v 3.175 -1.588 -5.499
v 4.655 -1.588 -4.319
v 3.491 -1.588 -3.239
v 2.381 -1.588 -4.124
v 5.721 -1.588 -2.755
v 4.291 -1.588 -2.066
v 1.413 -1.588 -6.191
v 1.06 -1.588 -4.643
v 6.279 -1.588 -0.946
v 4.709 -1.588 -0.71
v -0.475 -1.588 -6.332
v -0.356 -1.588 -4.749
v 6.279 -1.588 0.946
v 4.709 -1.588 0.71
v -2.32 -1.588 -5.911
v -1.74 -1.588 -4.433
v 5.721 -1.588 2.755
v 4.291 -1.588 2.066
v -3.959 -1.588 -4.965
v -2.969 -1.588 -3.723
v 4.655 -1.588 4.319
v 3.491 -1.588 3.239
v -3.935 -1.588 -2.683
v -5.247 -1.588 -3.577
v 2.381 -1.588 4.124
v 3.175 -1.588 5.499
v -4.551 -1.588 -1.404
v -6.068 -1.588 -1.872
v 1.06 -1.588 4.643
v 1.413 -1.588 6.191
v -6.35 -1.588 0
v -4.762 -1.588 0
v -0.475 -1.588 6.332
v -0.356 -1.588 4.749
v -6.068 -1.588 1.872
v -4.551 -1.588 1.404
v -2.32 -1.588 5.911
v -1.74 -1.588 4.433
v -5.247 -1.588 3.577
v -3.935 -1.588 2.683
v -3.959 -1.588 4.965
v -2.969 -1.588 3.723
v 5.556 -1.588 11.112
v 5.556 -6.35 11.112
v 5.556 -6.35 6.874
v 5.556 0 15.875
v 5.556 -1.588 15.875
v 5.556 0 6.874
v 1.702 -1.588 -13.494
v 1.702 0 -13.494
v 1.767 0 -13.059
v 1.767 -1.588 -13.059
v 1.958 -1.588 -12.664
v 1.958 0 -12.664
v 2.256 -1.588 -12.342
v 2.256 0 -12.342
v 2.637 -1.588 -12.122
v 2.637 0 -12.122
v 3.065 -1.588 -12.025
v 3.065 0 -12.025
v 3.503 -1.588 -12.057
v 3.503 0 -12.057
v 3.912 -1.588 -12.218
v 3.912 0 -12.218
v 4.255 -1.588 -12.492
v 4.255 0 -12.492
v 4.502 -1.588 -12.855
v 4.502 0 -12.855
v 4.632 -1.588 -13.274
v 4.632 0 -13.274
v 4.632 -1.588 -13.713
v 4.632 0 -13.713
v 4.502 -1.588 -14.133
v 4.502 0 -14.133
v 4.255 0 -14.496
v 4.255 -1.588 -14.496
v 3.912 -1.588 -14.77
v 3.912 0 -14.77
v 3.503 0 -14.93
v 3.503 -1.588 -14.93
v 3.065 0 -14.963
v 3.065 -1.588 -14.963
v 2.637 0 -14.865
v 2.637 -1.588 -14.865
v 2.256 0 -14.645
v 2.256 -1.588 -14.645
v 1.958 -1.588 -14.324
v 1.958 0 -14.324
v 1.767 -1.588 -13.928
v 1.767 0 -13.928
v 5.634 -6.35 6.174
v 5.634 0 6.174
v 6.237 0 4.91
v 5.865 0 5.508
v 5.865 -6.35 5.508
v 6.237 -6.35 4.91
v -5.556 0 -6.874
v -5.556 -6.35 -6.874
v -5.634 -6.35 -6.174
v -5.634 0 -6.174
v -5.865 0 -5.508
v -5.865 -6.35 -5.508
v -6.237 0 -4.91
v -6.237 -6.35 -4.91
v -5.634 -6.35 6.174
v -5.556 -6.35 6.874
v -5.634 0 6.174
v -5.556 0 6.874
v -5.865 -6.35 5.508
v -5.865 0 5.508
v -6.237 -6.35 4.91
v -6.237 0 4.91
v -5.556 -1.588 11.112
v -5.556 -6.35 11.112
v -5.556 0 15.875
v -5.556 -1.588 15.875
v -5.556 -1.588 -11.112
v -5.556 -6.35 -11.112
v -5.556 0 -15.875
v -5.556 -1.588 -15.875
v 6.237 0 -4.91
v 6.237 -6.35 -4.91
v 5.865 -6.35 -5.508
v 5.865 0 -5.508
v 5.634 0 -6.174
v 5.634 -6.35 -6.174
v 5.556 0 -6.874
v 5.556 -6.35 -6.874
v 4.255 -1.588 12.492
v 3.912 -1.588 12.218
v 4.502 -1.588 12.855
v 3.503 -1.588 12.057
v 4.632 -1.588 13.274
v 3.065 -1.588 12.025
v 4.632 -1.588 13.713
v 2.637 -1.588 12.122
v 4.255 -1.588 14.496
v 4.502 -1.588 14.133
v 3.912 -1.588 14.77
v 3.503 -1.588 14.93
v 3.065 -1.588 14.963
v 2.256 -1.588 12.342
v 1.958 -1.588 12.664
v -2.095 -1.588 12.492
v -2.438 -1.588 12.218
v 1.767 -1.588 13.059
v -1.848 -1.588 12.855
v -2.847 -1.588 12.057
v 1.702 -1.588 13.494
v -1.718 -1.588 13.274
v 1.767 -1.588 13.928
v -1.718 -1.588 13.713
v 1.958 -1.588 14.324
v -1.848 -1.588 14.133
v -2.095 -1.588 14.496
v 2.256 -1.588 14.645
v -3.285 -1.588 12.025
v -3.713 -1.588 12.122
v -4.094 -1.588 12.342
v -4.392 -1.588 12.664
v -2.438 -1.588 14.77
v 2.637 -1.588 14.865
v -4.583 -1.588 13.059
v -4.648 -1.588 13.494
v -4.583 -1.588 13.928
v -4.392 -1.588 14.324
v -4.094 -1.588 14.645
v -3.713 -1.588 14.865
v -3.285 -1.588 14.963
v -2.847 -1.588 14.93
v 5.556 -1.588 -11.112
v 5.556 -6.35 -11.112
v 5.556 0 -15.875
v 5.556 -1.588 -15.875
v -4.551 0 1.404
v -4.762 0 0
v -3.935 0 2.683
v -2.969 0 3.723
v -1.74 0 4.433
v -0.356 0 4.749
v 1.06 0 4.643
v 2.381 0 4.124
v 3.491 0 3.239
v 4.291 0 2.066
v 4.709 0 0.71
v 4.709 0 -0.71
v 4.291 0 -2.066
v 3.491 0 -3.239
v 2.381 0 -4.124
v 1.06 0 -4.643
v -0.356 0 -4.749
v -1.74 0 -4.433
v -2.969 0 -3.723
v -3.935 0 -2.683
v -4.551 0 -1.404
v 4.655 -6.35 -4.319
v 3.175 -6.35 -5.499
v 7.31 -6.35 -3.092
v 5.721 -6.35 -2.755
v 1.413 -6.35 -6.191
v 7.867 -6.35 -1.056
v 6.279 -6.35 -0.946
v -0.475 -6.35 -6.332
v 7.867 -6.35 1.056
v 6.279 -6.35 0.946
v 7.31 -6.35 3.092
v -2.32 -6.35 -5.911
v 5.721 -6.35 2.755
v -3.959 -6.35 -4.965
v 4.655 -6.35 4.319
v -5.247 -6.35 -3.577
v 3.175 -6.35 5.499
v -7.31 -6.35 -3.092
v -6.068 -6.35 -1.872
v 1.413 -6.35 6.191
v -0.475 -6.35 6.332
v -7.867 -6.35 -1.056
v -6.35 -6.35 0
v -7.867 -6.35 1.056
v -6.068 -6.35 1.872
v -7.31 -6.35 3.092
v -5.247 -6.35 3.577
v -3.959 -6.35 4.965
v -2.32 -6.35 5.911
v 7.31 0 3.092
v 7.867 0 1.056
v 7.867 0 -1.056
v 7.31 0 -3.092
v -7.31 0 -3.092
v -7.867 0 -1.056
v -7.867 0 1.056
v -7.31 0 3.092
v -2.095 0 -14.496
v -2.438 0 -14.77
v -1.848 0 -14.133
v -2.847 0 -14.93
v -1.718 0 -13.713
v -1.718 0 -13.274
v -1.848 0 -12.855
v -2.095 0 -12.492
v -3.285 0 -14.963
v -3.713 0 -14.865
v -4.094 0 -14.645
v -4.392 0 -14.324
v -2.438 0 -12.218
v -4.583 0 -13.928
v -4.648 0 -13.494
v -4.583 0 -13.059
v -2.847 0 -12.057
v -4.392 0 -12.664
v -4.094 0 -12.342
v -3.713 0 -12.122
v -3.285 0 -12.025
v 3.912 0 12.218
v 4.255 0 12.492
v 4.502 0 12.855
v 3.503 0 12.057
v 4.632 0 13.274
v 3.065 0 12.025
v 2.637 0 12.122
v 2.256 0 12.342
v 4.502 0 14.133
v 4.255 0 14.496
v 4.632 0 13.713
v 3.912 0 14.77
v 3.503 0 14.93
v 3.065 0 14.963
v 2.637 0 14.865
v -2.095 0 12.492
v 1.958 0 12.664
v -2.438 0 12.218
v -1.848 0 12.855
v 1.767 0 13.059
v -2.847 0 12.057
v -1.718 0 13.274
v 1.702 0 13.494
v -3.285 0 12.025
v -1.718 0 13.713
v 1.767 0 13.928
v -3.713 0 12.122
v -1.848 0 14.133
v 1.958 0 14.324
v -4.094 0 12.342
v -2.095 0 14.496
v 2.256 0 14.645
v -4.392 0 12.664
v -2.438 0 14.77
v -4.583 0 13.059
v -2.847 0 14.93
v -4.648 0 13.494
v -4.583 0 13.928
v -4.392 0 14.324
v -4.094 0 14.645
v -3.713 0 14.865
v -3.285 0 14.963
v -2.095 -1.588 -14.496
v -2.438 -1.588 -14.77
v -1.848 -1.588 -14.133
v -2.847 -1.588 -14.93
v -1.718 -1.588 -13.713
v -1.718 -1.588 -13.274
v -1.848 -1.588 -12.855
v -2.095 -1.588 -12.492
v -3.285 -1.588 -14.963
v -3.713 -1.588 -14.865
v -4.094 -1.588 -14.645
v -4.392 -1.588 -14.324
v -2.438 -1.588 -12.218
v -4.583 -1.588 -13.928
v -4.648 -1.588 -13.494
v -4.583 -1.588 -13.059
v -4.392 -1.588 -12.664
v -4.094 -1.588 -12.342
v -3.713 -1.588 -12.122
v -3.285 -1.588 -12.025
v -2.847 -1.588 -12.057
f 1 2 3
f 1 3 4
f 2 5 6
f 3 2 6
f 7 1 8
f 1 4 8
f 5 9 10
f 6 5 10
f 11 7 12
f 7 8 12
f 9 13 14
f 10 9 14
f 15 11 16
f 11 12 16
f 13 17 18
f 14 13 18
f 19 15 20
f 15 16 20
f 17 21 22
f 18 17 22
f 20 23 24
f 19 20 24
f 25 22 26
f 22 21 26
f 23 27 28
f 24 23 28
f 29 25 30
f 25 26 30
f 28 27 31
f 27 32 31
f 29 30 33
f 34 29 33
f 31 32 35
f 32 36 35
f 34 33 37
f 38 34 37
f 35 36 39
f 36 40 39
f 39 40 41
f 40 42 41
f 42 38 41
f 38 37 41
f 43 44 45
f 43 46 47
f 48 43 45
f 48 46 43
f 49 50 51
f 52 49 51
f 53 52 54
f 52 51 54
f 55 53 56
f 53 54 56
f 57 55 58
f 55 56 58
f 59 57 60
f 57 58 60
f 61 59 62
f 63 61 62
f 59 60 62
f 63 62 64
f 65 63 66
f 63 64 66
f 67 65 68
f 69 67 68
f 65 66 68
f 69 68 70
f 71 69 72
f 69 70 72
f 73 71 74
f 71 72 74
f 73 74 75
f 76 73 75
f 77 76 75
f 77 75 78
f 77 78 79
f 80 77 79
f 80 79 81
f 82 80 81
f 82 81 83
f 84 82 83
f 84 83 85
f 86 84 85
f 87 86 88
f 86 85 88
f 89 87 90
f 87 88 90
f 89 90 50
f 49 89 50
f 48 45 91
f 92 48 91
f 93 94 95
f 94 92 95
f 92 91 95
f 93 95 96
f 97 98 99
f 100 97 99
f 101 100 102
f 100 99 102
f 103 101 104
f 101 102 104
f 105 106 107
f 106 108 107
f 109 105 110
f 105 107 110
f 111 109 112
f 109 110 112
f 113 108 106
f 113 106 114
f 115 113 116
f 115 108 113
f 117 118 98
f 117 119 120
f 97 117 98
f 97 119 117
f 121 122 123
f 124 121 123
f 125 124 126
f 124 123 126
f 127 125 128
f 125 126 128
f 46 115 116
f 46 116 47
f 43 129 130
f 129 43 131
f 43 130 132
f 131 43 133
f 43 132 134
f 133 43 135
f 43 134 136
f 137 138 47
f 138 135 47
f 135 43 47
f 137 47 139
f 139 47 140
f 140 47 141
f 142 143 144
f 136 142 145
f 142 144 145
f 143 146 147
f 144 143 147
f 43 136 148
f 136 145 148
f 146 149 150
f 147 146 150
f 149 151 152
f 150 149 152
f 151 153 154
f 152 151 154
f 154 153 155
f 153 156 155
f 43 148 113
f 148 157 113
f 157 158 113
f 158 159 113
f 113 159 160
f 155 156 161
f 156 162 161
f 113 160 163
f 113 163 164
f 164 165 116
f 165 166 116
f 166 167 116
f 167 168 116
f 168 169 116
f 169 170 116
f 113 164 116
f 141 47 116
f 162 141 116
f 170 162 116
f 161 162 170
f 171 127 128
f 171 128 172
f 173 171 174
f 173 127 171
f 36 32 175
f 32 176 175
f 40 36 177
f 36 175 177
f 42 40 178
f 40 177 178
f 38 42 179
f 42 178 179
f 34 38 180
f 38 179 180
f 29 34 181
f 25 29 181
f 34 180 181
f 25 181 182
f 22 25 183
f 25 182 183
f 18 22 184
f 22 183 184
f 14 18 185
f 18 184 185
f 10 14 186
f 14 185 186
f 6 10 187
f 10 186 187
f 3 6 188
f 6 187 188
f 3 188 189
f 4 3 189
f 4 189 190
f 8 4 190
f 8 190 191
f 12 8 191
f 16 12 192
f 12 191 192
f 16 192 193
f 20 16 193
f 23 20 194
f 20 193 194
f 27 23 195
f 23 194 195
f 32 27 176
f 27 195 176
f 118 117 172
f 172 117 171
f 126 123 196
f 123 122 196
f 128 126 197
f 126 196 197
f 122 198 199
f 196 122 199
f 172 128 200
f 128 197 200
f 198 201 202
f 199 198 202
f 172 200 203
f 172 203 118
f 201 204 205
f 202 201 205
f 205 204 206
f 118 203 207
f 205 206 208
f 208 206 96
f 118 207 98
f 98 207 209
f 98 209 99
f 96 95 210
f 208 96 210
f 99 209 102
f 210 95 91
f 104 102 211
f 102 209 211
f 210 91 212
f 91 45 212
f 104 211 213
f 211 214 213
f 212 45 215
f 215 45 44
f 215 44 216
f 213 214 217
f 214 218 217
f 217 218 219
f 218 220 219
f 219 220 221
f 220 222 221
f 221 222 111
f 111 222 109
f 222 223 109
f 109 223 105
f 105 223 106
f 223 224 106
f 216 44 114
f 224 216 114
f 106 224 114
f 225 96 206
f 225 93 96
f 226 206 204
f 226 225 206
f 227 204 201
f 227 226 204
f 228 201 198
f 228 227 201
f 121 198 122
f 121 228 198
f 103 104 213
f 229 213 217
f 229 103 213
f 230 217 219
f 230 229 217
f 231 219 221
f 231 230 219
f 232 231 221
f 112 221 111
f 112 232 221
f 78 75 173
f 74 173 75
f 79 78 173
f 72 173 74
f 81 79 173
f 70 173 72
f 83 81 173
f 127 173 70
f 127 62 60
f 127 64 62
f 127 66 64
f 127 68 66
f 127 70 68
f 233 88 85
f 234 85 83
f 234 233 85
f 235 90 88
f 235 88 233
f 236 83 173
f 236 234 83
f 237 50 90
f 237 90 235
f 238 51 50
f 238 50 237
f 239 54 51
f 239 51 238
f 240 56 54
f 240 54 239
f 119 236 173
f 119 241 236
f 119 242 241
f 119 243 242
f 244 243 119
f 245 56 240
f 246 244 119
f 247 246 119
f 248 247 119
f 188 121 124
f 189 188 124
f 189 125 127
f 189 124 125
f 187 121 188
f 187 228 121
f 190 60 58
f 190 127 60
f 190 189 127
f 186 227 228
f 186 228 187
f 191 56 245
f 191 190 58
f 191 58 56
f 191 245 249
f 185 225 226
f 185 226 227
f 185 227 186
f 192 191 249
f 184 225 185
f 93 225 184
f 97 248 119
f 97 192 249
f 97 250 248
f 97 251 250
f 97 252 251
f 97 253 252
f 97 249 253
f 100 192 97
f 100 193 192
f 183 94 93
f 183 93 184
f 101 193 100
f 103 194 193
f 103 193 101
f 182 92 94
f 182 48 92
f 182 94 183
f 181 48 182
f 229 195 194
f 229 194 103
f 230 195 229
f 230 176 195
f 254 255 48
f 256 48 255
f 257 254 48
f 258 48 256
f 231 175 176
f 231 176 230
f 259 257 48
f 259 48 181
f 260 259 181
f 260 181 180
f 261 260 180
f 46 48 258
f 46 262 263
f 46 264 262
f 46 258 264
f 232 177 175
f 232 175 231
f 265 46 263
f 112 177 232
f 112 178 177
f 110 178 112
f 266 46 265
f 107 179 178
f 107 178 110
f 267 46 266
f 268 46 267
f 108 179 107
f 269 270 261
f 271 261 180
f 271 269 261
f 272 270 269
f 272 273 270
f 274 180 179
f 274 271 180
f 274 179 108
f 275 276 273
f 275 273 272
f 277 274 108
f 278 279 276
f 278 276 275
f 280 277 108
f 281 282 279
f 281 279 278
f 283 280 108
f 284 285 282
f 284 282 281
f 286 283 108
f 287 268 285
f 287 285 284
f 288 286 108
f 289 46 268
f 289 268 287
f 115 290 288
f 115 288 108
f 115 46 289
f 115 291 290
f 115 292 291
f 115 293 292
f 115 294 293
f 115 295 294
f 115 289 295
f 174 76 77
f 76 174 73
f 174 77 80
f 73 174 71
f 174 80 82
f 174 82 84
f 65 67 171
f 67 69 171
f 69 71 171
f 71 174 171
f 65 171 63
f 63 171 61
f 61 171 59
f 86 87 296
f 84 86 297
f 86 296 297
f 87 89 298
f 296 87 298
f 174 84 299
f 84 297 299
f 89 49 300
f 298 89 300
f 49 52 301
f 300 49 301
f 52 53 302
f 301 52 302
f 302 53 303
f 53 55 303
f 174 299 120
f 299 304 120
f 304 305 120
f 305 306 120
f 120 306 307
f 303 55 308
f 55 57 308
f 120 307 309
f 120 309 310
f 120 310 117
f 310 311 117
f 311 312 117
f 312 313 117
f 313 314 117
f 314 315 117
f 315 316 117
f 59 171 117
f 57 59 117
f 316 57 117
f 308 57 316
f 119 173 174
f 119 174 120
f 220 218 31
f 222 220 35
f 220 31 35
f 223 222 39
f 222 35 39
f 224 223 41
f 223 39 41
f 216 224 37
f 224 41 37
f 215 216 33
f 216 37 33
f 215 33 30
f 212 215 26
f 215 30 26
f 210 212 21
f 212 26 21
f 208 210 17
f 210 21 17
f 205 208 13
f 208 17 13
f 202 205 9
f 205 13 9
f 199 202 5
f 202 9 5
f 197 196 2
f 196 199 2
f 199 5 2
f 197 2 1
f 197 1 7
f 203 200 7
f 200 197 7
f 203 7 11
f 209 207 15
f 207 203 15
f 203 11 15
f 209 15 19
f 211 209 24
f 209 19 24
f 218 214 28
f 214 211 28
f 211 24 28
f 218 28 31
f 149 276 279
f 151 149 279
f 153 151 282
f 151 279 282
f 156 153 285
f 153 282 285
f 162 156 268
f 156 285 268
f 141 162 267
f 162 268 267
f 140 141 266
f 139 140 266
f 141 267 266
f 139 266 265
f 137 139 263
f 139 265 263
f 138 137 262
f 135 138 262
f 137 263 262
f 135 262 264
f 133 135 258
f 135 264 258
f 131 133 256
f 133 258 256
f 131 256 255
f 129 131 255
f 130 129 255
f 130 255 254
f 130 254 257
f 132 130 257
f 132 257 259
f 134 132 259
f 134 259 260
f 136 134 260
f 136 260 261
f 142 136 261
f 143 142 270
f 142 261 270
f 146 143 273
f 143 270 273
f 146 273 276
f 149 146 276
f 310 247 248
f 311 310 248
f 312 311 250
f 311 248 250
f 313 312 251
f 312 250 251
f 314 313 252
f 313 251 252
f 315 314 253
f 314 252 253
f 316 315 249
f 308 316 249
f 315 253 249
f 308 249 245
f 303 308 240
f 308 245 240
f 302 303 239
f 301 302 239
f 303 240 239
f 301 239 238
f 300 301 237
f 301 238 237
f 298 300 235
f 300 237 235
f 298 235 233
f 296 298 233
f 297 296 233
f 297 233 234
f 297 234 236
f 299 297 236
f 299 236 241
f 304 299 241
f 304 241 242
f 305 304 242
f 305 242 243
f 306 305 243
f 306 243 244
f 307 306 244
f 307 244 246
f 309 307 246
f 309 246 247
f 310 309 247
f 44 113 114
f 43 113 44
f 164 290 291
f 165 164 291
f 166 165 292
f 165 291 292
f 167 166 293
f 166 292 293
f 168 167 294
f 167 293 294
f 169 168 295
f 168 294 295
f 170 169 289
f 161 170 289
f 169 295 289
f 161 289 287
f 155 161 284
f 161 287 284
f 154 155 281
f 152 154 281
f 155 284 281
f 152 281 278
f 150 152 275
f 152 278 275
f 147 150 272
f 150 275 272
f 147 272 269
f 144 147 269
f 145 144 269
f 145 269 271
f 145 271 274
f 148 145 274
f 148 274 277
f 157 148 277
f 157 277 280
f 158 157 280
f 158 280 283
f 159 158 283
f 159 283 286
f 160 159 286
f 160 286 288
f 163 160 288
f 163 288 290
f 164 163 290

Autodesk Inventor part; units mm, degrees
ref_plane "YZ Plane" through (0, 0, 0) normal (1, 0, 0) x (0, 1, 0)
ref_plane "XZ Plane" through (0, 0, 0) normal (0, 1, 0) x (-1, 0, 0)
ref_plane "XY Plane" through (0, 0, 0) normal (0, 0, 1) x (1, 0, 0)
sketch "Sketch1" plane through (0, 0, 0) normal (0, 1, 0) x (-1, 0, 0)
  circle A0 centre (0, 0) radius 6.35
  circle A1 centre (0, 0) radius 7.9375
  line L0 (5.5563, 15.875) -> (-5.5563, 15.875)
  line L1 (-5.5563, 15.875) -> (-5.5563, -15.875)
  line L2 (-5.5563, -15.875) -> (5.5563, -15.875)
  line L3 (5.5563, -15.875) -> (5.5563, 15.875)
  line L4 (5.5563, 15.875) -> (-5.5563, -15.875) construction
  line L5 (-5.5563, 15.875) -> (5.5563, -15.875) construction
  line L6 (-5.5563, 0) -> (5.5563, 0) construction
  line L7 (-5.5563, 15.875) -> (5.5563, 15.875)
  line L8 (5.5563, 15.875) -> (5.5563, 11.1125)
  line L9 (5.5563, 11.1125) -> (-5.5563, 11.1125)
  line L10 (-5.5563, 11.1125) -> (-5.5563, 15.875)
  line L11 (-5.5563, 13.4937) -> (5.5563, 13.4937) construction
  circle A2 centre (-3.175, 13.4937) radius 1.4732
  line L12 (0, 15.875) -> (0, 11.1125) construction
  circle A3 centre (3.175, 13.4937) radius 1.4732
  line L13 (5.5563, -15.875) -> (-5.5563, -15.875)
  line L14 (-5.5563, -15.875) -> (5.5563, -15.875)
  line L15 (5.5563, -15.875) -> (5.5563, -11.1125)
  line L16 (5.5563, -11.1125) -> (-5.5563, -11.1125)
  line L17 (-5.5563, -11.1125) -> (-5.5563, -15.875)
  line L18 (-5.5563, -13.4937) -> (5.5563, -13.4937) construction
  circle A4 centre (-3.175, -13.4937) radius 1.4732
  line L19 (0, -15.875) -> (0, -11.1125) construction
  circle A5 centre (3.175, -13.4937) radius 1.4732
  circle A6 centre (0, 0) radius 4.7625
  point P0 (-5.5563, 5.6685)
  point P1 (-5.5563, -5.6685)
  point P2 (5.5563, -5.6685)
  point P3 (5.5563, 5.6685)
  dimension "d0" = 12.7
  dimension "d1" = 15.875
  dimension "d2" = 11.1125
  dimension "d3" = 31.75
  dimension "d4" = 4.7625
  dimension "d5" = 2.9464
  dimension "d6" = 2.3813
  dimension "d7" = 9.525
extrude "Extrusion1" add sketch "Sketch1" against normal blind 1.5875
extrude "Extrusion2" add sketch "Sketch1" against normal blind 6.35 contours A0 L3 A1 | A0 L1 A1 L3 | L3 A1 L1 A0 | A0 L1 A1 | A1 L1 L9 L3 | L3 L16 L1 A1
fillet "Fillet1" radius 3.175 4 edges at (-5.5563, -3.175, 5.6685) (-5.5563, -3.175, -5.6685) (5.5563, -3.175, 5.6685) (5.5563, -3.175, -5.6685)
sketch "Sketch2" plane through (0, -6.35, 0) normal (0, -1, 0) x (1, 0, 0)
  circle A0 centre (0, 0) radius 6.9453
  dimension "d13" = 13.8906
properties part number "Shaft Brace" material "Aluminum 6061"
